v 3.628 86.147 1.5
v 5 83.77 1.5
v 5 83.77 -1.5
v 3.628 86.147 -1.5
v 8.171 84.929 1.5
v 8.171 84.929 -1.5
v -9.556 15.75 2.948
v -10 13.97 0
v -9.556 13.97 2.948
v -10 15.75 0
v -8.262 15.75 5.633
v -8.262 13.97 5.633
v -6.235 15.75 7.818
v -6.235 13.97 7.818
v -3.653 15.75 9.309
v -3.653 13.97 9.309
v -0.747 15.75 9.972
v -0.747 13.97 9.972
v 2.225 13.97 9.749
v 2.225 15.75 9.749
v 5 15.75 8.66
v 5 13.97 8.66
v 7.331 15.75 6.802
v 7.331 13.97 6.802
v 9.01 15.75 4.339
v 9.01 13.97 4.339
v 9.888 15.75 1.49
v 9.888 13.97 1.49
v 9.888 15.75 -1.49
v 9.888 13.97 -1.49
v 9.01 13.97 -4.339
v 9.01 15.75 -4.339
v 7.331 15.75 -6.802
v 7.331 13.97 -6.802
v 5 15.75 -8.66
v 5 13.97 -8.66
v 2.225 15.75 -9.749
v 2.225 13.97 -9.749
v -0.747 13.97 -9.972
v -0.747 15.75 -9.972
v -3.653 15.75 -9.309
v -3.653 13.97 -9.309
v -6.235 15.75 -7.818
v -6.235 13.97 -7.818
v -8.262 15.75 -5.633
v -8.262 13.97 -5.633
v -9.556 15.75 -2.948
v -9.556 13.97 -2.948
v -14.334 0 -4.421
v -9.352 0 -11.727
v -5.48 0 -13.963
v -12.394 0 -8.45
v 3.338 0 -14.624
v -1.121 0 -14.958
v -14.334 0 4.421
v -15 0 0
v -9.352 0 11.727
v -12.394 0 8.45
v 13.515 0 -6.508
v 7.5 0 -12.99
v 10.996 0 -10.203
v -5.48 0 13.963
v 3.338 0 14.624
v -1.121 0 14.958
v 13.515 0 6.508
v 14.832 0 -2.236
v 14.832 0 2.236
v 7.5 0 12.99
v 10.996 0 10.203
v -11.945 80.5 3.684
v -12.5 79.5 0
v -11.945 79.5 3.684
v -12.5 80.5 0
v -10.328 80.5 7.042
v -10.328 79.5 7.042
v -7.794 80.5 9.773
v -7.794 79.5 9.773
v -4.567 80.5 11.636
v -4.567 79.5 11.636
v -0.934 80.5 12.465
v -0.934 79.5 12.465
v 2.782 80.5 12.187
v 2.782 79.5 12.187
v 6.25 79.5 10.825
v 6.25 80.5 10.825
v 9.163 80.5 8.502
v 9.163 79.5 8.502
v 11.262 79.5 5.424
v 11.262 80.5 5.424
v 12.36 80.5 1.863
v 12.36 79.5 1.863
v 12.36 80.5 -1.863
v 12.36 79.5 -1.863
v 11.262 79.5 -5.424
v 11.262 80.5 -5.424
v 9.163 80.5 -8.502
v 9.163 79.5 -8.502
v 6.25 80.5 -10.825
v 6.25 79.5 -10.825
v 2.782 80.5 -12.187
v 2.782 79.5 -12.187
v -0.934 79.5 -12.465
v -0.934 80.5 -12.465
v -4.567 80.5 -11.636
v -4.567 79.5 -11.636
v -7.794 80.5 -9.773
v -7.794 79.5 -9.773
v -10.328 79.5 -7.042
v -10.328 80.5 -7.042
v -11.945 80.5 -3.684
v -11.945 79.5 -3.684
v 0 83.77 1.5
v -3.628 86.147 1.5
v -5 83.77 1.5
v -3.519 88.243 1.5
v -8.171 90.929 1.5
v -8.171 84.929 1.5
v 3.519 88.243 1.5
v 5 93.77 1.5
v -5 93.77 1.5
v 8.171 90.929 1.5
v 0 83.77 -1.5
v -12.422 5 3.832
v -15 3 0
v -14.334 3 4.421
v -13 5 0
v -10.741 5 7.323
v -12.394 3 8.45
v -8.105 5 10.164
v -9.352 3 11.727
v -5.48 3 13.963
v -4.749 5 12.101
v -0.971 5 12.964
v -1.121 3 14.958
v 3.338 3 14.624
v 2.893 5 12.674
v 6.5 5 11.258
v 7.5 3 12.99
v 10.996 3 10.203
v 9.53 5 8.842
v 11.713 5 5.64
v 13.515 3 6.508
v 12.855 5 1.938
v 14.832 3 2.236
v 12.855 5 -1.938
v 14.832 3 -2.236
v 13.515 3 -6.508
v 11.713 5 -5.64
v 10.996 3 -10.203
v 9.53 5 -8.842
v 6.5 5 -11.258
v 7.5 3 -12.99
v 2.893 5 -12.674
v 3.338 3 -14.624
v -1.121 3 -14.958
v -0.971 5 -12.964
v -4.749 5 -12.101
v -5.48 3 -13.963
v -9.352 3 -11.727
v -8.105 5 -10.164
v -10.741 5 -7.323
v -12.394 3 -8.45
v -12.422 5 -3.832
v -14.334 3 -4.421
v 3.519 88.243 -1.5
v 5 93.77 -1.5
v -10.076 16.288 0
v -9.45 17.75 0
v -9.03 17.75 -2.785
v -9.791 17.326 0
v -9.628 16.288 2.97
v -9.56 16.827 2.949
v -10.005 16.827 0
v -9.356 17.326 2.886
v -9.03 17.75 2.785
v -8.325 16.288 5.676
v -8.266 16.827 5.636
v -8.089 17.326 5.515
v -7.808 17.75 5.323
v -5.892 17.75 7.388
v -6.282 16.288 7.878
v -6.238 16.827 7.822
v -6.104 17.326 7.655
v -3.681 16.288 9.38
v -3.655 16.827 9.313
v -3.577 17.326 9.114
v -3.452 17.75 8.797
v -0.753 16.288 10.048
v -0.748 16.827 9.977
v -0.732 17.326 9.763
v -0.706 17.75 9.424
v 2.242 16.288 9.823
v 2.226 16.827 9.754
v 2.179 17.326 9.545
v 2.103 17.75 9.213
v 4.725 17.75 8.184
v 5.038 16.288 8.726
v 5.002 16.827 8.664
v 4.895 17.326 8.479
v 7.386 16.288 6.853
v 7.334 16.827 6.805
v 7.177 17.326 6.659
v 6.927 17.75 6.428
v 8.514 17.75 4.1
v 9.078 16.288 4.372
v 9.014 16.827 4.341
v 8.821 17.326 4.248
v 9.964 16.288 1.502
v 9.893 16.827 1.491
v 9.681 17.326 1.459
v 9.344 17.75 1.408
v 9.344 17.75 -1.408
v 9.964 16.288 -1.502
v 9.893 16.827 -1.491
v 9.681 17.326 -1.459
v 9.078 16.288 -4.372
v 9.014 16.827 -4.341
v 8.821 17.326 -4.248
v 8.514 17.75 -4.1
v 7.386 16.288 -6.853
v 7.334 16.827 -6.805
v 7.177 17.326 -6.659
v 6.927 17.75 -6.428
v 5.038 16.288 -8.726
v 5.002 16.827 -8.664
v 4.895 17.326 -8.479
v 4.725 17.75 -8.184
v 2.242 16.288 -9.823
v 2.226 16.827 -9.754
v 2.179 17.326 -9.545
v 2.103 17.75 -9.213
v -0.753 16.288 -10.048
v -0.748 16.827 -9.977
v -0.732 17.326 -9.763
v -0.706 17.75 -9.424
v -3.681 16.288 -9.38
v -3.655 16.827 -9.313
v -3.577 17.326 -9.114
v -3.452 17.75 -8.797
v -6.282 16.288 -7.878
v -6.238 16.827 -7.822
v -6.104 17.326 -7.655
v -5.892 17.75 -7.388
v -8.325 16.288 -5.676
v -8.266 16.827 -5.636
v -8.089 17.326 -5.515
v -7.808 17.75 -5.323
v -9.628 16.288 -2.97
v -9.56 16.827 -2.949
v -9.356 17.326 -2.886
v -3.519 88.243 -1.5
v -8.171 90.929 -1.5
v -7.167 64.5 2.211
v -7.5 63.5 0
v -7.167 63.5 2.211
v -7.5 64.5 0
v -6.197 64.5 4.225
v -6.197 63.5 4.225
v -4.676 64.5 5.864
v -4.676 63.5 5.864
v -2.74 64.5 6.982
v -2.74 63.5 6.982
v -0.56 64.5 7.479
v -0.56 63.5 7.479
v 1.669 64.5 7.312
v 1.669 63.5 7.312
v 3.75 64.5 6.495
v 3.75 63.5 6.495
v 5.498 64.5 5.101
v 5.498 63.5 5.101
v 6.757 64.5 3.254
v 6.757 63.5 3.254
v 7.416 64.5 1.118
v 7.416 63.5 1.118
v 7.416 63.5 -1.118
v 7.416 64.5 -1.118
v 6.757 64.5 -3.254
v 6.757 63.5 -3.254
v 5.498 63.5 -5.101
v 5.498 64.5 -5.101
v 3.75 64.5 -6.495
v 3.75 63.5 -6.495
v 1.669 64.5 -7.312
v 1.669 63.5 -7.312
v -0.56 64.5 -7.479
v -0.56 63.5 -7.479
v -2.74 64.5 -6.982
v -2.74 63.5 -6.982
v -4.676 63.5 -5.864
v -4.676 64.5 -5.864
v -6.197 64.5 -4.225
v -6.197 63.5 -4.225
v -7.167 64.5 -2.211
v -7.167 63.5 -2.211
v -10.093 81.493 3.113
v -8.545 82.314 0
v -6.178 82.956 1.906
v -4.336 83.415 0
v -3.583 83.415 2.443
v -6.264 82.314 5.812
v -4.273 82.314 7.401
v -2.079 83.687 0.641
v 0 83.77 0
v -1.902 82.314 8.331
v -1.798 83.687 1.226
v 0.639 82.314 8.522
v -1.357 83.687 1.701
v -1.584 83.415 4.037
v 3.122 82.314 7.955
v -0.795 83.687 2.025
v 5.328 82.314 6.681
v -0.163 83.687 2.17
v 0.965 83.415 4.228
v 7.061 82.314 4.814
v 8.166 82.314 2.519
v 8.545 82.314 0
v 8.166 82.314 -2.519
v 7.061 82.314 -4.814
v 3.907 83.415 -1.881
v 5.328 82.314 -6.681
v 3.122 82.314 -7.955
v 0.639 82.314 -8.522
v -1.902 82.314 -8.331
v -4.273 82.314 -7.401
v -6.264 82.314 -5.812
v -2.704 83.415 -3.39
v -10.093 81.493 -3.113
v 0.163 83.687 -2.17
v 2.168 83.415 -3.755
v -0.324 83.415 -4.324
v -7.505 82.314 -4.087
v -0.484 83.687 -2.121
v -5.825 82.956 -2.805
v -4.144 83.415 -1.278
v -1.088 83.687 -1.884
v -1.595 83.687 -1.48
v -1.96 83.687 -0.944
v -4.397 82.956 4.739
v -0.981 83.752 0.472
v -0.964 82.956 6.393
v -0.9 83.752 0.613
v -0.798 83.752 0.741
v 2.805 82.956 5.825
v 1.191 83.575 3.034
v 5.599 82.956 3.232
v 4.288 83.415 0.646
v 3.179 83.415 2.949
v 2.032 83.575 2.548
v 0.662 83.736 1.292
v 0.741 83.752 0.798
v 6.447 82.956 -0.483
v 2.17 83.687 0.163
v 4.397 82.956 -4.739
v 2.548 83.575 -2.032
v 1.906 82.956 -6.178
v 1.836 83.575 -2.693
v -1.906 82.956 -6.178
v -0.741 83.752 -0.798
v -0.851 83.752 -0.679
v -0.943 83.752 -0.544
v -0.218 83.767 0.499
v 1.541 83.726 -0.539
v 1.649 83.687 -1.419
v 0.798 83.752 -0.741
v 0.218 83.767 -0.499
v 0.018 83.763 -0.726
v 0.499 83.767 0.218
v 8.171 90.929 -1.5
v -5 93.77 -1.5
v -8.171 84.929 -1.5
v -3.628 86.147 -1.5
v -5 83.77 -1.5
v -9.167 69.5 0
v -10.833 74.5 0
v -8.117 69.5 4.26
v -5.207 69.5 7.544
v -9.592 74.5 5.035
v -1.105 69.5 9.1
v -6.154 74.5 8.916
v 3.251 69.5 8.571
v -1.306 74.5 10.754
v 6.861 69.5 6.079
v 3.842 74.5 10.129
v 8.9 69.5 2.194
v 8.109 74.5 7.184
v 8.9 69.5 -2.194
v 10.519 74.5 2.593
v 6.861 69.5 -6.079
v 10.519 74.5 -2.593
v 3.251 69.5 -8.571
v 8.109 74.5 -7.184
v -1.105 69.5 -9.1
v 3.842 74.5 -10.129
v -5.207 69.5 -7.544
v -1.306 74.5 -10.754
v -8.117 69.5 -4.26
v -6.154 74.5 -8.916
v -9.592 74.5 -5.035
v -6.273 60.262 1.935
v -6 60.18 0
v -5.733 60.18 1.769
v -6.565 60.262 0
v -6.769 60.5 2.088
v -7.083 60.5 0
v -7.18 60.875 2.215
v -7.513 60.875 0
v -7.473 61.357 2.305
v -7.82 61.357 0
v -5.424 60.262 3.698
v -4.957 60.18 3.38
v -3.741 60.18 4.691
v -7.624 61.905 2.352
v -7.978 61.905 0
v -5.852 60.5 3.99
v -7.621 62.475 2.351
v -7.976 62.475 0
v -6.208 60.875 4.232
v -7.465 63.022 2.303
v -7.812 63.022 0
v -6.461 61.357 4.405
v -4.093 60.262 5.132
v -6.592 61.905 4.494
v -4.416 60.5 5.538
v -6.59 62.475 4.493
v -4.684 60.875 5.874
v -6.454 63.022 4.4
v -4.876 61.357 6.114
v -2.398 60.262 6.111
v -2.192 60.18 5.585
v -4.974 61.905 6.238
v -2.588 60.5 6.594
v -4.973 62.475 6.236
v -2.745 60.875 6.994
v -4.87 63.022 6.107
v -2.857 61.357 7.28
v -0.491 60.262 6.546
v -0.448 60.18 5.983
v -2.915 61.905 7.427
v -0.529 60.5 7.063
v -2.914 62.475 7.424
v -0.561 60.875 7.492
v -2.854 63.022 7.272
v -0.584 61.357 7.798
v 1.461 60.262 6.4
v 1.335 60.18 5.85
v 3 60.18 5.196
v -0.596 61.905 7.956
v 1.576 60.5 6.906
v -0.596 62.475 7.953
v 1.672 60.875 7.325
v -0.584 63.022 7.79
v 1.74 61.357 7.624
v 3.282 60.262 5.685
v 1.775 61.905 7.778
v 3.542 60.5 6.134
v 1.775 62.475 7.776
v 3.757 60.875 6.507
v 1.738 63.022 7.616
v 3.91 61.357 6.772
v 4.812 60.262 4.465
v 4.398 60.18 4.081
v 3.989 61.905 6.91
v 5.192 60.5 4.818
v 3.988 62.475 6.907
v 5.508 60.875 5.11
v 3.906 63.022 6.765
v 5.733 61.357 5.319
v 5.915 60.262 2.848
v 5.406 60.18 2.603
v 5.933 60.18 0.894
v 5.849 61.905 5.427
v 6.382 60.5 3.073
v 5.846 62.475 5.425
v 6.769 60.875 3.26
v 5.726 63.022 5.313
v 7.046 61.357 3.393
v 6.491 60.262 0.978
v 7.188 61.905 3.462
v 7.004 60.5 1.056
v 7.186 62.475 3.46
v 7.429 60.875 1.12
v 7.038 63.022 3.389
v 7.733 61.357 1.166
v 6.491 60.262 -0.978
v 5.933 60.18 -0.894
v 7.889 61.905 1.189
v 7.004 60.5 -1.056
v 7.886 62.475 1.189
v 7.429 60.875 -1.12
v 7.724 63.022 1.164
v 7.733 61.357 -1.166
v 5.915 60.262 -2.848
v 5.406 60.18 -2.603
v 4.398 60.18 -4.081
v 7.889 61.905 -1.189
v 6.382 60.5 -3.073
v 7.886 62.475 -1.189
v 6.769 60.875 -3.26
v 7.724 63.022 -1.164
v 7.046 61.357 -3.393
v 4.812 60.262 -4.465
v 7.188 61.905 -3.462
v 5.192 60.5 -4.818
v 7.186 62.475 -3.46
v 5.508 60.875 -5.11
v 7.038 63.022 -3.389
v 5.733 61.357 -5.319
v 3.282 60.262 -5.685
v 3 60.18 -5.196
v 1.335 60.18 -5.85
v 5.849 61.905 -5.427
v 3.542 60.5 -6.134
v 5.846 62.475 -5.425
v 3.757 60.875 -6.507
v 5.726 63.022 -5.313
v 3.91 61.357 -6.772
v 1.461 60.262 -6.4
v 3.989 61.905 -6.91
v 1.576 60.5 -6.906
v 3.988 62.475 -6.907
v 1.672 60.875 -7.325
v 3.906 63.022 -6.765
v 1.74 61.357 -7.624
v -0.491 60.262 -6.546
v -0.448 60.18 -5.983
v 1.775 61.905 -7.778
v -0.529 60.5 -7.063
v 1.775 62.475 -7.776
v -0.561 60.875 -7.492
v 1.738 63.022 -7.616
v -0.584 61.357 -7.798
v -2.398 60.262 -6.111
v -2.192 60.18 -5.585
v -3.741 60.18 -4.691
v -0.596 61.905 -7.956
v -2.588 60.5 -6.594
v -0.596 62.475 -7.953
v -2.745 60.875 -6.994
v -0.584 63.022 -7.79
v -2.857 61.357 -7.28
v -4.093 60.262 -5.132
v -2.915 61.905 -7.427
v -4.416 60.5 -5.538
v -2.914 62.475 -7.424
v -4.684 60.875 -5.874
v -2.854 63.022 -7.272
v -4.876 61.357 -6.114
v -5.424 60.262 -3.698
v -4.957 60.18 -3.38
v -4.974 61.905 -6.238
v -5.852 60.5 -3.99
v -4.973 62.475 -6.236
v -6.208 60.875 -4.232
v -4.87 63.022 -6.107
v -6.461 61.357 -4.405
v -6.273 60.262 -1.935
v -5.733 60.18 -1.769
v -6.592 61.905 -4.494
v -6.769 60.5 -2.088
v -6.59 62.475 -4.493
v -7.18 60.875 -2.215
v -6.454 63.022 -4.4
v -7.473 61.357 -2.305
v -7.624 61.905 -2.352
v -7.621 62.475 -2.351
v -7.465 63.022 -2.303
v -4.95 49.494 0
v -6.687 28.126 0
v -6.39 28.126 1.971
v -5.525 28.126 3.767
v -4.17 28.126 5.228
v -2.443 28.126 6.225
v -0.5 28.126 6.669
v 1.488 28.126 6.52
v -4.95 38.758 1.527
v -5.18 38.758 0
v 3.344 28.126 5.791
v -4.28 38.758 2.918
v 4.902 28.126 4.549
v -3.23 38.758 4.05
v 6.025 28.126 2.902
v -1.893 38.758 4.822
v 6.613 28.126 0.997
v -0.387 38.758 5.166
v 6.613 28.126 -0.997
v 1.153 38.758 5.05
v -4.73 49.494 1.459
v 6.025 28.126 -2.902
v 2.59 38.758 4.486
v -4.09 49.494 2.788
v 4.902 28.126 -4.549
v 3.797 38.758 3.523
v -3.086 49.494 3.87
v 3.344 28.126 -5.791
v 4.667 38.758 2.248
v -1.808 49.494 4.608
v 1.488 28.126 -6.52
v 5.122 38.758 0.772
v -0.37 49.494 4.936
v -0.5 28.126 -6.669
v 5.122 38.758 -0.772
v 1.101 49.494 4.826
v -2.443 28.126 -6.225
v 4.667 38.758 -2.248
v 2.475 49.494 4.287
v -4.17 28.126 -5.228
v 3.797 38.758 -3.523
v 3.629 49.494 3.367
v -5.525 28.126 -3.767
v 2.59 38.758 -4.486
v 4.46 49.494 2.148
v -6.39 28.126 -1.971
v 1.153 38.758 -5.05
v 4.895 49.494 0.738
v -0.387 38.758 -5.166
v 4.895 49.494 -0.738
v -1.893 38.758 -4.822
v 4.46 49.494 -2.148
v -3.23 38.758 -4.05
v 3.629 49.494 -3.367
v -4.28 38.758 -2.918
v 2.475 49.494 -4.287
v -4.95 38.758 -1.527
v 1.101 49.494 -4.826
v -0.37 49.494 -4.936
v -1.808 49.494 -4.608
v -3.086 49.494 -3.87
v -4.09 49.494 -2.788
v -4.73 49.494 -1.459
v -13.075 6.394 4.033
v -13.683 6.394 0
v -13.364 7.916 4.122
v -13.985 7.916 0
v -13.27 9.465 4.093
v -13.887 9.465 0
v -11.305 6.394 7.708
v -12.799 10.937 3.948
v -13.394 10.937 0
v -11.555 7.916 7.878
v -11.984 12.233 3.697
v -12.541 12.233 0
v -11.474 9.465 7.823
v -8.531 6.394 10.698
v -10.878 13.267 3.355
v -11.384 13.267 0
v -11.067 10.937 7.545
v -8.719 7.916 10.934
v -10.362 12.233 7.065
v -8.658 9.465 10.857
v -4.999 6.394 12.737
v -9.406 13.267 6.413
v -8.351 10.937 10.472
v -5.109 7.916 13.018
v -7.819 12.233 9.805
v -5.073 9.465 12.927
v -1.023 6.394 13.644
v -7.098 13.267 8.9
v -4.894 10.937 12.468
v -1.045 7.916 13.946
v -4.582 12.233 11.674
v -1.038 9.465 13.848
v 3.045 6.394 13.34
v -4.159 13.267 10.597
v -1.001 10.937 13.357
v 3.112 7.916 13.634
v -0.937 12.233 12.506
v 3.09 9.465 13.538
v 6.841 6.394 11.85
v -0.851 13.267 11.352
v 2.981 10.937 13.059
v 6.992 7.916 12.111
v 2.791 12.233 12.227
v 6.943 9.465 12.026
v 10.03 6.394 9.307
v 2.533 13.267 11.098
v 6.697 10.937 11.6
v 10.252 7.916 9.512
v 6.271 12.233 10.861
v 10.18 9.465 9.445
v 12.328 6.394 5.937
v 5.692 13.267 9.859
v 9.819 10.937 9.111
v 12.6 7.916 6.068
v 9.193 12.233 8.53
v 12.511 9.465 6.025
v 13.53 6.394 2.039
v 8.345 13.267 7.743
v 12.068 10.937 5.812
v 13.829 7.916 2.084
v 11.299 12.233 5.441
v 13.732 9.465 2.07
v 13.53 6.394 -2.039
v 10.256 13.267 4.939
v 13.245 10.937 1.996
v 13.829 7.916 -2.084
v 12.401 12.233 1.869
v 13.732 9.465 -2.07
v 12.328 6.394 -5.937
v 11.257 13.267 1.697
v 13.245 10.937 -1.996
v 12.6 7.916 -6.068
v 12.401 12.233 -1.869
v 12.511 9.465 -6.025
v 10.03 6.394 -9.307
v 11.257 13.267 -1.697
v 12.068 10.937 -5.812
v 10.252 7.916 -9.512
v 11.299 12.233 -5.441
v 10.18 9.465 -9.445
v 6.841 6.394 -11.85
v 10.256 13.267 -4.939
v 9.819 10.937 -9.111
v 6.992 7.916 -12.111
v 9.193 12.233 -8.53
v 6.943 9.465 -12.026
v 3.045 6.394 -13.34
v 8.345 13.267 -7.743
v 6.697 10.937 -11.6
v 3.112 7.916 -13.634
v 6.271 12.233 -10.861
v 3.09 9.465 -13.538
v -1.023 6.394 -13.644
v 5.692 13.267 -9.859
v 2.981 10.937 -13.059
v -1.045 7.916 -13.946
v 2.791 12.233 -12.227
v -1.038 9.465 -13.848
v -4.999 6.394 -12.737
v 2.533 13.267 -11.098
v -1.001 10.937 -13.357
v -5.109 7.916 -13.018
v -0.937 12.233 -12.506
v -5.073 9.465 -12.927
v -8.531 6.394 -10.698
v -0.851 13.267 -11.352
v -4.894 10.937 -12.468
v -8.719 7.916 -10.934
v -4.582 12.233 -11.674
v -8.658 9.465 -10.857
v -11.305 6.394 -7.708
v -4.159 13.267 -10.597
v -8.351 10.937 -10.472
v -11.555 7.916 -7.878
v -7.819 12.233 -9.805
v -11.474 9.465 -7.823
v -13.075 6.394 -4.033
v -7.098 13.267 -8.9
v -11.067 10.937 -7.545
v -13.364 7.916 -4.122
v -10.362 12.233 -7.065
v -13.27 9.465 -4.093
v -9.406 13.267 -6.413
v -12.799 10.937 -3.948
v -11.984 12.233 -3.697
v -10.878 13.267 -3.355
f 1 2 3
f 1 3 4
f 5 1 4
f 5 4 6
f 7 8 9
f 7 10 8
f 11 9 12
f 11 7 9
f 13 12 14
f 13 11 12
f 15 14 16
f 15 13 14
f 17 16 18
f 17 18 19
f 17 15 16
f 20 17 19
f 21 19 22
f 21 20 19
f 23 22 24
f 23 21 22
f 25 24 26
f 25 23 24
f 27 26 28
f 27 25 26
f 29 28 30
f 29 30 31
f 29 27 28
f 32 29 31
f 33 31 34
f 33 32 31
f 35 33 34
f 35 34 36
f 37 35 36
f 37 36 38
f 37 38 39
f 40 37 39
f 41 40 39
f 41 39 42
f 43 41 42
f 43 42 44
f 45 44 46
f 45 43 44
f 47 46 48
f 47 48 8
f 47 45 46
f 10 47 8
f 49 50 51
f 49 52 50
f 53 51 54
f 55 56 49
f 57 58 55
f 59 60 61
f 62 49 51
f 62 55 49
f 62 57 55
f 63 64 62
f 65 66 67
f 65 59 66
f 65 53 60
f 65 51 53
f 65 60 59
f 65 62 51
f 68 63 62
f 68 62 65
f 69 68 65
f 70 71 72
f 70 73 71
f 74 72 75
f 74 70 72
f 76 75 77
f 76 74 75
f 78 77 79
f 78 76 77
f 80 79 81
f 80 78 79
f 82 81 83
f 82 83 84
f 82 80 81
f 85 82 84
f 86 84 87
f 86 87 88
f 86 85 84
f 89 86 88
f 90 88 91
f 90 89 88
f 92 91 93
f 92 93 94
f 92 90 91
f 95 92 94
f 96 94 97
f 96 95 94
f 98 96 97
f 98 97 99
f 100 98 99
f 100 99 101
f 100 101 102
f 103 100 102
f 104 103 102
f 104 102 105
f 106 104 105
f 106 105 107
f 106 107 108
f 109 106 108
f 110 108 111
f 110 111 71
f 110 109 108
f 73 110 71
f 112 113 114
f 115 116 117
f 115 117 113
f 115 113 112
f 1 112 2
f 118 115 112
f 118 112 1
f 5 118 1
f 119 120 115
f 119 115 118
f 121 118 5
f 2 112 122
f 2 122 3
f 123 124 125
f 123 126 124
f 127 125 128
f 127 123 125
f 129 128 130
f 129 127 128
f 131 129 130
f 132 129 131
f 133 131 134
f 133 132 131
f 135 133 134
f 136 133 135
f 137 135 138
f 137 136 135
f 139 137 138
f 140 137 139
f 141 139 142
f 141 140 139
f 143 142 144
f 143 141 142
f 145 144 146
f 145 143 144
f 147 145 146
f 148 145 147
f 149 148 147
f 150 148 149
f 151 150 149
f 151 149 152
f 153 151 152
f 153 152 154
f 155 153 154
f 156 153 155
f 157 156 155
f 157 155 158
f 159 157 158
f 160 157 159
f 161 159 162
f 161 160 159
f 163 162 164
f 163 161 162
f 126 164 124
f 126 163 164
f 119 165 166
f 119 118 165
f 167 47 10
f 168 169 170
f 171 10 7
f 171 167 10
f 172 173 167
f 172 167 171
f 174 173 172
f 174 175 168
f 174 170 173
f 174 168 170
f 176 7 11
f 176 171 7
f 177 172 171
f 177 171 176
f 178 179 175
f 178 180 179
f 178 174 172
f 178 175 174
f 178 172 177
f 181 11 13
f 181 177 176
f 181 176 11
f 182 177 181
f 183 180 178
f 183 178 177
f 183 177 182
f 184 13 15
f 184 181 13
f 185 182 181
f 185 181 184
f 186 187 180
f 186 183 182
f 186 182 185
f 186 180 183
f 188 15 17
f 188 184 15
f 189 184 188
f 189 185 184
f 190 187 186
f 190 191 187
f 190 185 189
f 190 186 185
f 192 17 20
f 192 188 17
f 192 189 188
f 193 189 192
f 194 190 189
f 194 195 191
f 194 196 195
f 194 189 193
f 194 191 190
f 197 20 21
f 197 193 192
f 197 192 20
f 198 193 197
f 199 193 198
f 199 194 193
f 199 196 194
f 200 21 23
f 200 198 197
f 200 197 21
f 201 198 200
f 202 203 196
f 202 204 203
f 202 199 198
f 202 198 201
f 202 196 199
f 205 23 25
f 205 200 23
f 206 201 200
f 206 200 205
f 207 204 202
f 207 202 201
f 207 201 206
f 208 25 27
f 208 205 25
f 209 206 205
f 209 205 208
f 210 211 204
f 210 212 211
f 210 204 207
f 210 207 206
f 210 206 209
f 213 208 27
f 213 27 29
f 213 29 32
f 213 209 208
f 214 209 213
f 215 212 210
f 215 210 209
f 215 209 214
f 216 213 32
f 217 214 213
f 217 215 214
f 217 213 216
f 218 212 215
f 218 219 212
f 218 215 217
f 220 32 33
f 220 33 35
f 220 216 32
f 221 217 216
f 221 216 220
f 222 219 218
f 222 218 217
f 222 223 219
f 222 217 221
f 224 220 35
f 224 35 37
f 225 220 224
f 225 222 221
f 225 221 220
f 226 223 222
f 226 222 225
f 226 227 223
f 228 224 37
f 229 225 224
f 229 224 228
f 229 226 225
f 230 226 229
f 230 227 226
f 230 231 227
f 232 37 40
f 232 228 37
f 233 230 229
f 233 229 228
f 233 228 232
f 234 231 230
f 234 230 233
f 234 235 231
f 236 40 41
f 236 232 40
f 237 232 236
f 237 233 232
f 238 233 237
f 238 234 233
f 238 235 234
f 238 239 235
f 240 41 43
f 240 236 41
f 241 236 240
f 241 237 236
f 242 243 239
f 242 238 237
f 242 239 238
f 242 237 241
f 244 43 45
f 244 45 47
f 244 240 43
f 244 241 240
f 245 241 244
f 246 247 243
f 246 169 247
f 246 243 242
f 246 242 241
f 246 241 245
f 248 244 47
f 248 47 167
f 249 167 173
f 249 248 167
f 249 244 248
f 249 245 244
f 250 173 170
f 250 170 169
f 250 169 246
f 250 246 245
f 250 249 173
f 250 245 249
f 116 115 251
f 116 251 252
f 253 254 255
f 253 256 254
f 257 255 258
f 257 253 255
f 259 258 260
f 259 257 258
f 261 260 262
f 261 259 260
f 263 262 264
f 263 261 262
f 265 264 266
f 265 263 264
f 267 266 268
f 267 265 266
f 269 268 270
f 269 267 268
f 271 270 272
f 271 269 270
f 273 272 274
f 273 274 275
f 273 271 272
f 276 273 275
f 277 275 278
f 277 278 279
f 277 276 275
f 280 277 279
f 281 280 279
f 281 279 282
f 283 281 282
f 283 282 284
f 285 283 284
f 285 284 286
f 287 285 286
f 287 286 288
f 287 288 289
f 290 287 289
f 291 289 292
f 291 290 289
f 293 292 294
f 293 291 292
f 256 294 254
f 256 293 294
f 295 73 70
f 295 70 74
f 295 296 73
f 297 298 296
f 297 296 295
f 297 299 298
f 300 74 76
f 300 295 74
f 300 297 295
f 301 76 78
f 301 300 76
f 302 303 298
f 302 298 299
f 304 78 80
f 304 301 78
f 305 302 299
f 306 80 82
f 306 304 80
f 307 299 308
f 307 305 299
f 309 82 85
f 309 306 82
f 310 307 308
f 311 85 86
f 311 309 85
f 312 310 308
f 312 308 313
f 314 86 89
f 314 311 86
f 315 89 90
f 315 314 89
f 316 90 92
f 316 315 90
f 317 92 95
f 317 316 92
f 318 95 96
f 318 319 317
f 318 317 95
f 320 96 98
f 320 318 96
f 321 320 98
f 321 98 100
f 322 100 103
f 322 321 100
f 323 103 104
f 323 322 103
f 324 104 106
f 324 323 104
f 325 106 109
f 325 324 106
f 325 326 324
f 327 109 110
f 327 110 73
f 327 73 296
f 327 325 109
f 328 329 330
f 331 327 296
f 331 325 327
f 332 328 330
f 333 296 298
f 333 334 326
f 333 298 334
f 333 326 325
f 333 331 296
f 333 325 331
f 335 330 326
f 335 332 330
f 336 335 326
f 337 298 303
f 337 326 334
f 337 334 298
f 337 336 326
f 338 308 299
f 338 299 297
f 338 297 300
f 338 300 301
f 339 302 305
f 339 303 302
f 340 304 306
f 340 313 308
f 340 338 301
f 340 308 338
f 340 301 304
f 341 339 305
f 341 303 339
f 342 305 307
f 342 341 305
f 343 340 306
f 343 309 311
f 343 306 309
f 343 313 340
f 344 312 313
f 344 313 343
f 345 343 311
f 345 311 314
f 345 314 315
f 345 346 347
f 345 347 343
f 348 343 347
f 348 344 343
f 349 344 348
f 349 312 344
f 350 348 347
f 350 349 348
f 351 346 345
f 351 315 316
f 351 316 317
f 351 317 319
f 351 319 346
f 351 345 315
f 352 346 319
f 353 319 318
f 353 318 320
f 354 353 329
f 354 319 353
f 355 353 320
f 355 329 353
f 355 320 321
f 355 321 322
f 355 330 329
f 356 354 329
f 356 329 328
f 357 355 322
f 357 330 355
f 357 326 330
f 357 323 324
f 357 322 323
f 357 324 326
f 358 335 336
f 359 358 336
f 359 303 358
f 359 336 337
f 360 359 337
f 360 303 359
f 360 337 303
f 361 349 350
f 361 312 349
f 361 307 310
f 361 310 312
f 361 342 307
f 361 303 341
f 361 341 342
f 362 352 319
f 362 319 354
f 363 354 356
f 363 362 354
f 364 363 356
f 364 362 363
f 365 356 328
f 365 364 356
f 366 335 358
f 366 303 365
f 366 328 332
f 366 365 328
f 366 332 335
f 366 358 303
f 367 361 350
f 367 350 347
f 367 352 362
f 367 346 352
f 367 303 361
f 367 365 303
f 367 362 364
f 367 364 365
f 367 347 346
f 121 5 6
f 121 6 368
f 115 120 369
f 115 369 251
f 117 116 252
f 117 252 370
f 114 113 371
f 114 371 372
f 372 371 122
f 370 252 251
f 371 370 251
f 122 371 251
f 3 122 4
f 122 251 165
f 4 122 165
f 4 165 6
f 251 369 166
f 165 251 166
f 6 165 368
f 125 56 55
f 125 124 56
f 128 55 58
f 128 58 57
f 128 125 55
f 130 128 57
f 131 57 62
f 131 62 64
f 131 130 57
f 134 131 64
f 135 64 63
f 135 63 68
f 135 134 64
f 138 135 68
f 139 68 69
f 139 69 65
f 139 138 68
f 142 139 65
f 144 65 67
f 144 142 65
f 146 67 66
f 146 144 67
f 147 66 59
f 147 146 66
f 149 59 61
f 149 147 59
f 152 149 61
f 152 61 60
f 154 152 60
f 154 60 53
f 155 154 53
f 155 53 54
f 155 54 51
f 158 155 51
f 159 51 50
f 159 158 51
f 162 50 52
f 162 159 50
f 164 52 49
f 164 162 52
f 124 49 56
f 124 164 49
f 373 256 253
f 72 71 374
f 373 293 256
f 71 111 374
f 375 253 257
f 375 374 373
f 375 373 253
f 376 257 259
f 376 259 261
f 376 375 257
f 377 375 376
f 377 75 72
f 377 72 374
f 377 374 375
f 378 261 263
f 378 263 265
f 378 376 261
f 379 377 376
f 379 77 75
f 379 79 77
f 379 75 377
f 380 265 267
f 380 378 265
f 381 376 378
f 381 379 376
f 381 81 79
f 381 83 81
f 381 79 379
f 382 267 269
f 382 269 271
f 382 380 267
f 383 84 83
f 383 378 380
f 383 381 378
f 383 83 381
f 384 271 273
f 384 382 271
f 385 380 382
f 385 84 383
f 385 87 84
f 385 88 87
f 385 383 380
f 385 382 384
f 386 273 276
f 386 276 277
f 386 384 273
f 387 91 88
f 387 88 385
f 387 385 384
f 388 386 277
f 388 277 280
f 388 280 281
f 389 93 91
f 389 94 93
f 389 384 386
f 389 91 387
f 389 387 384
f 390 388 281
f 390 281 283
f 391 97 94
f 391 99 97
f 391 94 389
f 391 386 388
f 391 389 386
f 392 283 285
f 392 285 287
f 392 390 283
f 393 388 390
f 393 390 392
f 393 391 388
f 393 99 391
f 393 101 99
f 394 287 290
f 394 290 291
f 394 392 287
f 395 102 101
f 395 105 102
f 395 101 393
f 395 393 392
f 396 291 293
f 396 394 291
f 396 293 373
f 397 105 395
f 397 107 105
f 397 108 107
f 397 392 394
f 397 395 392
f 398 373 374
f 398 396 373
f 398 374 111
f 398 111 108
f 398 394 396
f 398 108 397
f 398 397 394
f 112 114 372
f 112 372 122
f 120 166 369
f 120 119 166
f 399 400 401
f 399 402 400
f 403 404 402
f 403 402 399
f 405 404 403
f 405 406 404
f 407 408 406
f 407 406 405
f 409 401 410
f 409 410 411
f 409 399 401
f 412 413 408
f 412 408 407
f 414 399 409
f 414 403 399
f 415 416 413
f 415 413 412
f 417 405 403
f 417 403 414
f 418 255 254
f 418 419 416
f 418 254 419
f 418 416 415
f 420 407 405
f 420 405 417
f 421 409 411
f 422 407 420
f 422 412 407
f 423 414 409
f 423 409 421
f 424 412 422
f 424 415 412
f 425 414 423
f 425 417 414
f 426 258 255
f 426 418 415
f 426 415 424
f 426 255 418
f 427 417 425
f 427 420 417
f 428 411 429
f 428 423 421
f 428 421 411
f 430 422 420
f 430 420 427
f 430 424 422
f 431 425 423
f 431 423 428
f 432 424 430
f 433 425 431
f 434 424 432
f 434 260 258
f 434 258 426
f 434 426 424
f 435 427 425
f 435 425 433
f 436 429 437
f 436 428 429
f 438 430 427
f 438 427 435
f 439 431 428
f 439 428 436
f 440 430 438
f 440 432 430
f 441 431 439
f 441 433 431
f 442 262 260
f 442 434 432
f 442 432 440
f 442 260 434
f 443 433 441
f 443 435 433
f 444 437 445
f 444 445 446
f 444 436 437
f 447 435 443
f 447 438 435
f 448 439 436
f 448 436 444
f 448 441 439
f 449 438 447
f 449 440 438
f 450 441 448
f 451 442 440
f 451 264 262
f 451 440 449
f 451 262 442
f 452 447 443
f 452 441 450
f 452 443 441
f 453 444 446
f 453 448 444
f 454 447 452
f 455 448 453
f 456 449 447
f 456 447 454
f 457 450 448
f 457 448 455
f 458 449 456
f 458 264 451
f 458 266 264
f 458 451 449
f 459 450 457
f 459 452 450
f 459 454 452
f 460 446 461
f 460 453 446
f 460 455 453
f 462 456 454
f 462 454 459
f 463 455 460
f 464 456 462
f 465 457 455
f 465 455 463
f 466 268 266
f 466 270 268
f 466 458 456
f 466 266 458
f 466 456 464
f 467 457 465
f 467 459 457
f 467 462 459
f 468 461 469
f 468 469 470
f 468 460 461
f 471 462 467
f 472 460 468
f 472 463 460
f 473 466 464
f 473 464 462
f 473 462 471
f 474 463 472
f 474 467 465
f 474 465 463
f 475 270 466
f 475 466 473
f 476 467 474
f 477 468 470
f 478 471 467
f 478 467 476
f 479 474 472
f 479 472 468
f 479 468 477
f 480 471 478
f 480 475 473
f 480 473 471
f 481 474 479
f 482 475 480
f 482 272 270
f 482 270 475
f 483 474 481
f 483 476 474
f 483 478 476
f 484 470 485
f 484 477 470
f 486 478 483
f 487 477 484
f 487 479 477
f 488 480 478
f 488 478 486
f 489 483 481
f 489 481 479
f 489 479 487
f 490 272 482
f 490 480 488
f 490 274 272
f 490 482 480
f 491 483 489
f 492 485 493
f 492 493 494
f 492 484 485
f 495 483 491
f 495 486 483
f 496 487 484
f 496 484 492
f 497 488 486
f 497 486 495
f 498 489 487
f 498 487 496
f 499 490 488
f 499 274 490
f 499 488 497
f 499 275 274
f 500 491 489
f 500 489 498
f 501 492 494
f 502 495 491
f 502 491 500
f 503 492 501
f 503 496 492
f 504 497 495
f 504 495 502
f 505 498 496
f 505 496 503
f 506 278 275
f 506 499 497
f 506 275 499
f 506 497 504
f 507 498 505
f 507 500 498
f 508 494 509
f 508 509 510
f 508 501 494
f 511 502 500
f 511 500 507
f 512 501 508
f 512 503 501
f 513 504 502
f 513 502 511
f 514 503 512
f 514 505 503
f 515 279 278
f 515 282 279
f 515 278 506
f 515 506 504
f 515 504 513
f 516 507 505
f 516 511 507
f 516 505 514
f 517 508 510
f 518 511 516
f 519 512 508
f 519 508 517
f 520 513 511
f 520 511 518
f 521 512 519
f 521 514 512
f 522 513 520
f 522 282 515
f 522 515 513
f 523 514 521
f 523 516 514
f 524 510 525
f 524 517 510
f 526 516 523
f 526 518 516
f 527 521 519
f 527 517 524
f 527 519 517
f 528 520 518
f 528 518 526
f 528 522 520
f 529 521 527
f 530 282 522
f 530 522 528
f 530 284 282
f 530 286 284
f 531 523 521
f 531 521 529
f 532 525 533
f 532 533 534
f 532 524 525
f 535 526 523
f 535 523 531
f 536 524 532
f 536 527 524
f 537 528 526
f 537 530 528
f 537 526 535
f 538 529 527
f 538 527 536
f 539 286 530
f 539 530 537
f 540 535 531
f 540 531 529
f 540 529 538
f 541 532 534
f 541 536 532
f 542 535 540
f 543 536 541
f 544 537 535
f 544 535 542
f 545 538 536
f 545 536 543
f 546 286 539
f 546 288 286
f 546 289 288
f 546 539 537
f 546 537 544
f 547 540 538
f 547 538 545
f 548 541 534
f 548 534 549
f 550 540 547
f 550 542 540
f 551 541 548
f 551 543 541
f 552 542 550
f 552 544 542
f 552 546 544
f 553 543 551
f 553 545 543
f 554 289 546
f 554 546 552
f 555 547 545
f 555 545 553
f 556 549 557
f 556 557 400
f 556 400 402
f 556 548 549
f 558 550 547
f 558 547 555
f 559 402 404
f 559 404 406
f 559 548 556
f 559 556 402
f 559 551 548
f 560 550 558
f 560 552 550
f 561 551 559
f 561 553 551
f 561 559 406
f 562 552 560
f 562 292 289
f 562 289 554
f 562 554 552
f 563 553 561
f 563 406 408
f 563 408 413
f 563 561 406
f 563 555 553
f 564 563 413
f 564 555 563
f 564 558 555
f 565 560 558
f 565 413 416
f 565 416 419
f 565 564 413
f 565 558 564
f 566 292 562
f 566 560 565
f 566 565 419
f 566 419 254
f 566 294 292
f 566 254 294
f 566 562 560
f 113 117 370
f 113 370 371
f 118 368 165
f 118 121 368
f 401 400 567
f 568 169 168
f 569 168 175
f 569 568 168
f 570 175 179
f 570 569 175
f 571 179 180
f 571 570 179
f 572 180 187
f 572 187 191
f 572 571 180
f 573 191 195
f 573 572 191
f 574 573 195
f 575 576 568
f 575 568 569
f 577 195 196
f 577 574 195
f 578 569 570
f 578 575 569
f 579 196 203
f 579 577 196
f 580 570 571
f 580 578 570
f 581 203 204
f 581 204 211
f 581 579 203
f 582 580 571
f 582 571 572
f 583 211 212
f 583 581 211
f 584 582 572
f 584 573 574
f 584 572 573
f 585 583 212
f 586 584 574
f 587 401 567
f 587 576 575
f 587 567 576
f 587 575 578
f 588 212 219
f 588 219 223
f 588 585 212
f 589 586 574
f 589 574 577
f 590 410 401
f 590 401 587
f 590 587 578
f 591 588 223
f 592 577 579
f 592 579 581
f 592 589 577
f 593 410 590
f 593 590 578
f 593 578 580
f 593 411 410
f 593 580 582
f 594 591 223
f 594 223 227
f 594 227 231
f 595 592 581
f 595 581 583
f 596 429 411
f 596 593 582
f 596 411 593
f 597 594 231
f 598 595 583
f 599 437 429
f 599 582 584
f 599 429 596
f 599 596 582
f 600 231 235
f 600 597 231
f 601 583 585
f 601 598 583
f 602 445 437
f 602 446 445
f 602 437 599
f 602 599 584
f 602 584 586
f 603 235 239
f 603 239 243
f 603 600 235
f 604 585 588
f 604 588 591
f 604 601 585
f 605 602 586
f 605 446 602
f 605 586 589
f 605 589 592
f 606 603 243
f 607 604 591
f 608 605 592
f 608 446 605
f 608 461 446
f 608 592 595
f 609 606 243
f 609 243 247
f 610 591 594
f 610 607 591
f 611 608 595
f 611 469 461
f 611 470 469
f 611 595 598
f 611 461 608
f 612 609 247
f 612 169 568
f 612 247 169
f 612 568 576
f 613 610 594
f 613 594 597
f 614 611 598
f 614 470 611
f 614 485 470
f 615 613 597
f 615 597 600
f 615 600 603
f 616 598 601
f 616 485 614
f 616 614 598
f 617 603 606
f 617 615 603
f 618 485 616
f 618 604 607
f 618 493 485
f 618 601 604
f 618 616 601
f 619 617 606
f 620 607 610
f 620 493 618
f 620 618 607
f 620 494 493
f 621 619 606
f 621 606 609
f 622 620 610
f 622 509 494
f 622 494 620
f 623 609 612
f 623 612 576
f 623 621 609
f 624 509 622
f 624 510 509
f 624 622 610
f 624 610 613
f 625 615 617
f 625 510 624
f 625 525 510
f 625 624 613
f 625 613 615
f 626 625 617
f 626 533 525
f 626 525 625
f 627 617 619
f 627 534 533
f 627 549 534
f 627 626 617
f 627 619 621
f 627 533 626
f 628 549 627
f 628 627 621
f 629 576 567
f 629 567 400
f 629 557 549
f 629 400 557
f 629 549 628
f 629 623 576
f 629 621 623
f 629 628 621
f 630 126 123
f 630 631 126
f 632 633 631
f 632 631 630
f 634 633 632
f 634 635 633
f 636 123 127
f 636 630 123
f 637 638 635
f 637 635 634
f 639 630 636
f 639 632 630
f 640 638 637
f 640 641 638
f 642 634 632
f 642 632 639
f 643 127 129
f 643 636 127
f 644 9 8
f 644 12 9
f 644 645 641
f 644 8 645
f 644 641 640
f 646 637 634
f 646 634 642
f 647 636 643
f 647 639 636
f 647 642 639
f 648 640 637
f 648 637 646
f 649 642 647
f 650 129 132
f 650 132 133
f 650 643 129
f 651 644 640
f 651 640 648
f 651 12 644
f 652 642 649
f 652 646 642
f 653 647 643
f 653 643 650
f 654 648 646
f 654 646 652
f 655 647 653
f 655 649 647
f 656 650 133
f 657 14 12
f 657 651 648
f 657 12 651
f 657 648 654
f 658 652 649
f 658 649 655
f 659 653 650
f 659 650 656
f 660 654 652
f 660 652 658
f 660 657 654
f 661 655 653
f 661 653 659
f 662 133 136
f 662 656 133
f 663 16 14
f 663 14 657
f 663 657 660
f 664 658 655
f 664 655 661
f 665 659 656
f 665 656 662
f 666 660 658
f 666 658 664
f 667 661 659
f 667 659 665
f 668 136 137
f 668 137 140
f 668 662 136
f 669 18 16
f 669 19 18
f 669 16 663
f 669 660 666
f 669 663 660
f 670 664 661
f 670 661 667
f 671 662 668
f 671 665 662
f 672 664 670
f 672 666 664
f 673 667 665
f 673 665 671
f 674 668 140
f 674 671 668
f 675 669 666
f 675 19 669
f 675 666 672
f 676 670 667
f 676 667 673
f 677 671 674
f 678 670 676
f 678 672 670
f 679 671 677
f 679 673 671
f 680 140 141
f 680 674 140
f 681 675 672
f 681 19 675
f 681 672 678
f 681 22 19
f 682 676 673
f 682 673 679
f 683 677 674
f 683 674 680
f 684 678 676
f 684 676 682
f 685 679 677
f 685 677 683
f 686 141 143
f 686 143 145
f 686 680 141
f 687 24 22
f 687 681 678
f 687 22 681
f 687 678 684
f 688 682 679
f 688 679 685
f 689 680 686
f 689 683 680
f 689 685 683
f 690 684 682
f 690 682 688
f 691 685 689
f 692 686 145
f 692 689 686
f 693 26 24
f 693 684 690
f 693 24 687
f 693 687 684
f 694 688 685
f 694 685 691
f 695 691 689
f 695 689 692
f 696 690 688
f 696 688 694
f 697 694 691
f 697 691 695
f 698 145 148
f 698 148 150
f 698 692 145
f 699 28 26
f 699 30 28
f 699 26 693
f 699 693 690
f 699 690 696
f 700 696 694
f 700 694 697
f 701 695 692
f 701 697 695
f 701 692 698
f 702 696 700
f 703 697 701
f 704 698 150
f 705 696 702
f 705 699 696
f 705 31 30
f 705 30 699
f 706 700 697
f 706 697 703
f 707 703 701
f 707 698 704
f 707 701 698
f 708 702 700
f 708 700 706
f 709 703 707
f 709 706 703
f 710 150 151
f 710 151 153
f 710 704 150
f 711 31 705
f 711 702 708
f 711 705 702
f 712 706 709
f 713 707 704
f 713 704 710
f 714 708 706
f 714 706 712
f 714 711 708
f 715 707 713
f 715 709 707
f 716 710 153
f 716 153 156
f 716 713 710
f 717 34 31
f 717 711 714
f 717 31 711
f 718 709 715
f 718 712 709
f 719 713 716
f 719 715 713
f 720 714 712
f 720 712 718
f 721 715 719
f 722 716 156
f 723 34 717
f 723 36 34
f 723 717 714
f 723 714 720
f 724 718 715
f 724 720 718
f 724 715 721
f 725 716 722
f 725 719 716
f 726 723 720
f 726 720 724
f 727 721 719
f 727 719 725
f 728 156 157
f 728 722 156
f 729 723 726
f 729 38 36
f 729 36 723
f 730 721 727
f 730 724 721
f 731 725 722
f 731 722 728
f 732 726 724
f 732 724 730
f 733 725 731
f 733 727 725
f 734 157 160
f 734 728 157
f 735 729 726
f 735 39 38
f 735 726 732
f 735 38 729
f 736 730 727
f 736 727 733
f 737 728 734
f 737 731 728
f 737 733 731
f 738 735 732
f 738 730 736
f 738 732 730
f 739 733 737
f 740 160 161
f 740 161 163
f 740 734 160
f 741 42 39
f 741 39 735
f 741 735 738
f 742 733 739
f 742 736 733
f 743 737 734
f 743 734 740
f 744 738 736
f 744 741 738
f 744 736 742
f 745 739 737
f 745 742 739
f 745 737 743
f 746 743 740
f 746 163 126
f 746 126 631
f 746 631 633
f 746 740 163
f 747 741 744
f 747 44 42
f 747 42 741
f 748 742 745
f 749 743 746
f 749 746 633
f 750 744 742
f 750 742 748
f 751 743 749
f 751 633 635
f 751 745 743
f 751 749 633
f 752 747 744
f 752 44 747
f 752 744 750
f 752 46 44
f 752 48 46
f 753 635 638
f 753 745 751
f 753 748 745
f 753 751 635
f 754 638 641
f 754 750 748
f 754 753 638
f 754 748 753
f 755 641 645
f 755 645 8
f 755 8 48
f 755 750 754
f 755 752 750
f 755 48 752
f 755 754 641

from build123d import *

# Parameters (mm, degrees)
BOSS_EXTRUDE1_DEPTH = 1.5


with BuildPart() as part:
    # Sketch2 → Revolve2 (revolve)
    with BuildSketch(Plane.XY):
        with BuildLine():
            Line((0, 0), (-15, 0))
            Line((-15, 0), (-15, 3))
            Line((-15, 3), (-13, 5))
            ThreePointArc((-13, 5), (-13.688325627, 10.216881481), (-10, 13.97))
            Line((-10, 13.97), (-10, 15.75))
            ThreePointArc((-10, 15.75), (-10.004542035, 16.82687406), (-9.45, 17.75))
            ThreePointArc((-9.45, 17.75), (-5.180228784, 38.758083651), (-6, 60.18))
            ThreePointArc((-6, 60.18), (-7.820078528, 61.356530786), (-7.5, 63.5))
            Line((-7.5, 63.5), (-7.5, 64.5))
            Line((-7.5, 64.5), (-12.5, 79.5))
            Line((-12.5, 79.5), (-12.5, 80.5))
            ThreePointArc((-12.5, 80.5), (-6.464902058, 82.956491046), (0, 83.77))
            Line((0, 83.77), (0, 0))
        make_face()
    revolve(axis=Axis((0, -79.69301575, 0), (0, 1, 0)))


with BuildPart() as body_2:
    # Sketch3 → Boss-Extrude1 (new body, symmetric)
    with BuildSketch(Plane.XY):
        Polygon((5, 93.77), (-5, 93.77), (-3.519138795, 88.243350745), (-8.171354159, 90.929308538), (-8.171354159, 84.929308538), (-3.628074115, 86.146676757), (-4.999999981, 83.770431453), (0, 83.77), (4.999999981, 83.770431453), (3.628074115, 86.146676757), (8.171354159, 84.929308538), (8.171354159, 90.929308538), (3.519138795, 88.243350745), align=None)
    extrude(amount=BOSS_EXTRUDE1_DEPTH, both=True)


solid = Compound([part.part, body_2.part])
